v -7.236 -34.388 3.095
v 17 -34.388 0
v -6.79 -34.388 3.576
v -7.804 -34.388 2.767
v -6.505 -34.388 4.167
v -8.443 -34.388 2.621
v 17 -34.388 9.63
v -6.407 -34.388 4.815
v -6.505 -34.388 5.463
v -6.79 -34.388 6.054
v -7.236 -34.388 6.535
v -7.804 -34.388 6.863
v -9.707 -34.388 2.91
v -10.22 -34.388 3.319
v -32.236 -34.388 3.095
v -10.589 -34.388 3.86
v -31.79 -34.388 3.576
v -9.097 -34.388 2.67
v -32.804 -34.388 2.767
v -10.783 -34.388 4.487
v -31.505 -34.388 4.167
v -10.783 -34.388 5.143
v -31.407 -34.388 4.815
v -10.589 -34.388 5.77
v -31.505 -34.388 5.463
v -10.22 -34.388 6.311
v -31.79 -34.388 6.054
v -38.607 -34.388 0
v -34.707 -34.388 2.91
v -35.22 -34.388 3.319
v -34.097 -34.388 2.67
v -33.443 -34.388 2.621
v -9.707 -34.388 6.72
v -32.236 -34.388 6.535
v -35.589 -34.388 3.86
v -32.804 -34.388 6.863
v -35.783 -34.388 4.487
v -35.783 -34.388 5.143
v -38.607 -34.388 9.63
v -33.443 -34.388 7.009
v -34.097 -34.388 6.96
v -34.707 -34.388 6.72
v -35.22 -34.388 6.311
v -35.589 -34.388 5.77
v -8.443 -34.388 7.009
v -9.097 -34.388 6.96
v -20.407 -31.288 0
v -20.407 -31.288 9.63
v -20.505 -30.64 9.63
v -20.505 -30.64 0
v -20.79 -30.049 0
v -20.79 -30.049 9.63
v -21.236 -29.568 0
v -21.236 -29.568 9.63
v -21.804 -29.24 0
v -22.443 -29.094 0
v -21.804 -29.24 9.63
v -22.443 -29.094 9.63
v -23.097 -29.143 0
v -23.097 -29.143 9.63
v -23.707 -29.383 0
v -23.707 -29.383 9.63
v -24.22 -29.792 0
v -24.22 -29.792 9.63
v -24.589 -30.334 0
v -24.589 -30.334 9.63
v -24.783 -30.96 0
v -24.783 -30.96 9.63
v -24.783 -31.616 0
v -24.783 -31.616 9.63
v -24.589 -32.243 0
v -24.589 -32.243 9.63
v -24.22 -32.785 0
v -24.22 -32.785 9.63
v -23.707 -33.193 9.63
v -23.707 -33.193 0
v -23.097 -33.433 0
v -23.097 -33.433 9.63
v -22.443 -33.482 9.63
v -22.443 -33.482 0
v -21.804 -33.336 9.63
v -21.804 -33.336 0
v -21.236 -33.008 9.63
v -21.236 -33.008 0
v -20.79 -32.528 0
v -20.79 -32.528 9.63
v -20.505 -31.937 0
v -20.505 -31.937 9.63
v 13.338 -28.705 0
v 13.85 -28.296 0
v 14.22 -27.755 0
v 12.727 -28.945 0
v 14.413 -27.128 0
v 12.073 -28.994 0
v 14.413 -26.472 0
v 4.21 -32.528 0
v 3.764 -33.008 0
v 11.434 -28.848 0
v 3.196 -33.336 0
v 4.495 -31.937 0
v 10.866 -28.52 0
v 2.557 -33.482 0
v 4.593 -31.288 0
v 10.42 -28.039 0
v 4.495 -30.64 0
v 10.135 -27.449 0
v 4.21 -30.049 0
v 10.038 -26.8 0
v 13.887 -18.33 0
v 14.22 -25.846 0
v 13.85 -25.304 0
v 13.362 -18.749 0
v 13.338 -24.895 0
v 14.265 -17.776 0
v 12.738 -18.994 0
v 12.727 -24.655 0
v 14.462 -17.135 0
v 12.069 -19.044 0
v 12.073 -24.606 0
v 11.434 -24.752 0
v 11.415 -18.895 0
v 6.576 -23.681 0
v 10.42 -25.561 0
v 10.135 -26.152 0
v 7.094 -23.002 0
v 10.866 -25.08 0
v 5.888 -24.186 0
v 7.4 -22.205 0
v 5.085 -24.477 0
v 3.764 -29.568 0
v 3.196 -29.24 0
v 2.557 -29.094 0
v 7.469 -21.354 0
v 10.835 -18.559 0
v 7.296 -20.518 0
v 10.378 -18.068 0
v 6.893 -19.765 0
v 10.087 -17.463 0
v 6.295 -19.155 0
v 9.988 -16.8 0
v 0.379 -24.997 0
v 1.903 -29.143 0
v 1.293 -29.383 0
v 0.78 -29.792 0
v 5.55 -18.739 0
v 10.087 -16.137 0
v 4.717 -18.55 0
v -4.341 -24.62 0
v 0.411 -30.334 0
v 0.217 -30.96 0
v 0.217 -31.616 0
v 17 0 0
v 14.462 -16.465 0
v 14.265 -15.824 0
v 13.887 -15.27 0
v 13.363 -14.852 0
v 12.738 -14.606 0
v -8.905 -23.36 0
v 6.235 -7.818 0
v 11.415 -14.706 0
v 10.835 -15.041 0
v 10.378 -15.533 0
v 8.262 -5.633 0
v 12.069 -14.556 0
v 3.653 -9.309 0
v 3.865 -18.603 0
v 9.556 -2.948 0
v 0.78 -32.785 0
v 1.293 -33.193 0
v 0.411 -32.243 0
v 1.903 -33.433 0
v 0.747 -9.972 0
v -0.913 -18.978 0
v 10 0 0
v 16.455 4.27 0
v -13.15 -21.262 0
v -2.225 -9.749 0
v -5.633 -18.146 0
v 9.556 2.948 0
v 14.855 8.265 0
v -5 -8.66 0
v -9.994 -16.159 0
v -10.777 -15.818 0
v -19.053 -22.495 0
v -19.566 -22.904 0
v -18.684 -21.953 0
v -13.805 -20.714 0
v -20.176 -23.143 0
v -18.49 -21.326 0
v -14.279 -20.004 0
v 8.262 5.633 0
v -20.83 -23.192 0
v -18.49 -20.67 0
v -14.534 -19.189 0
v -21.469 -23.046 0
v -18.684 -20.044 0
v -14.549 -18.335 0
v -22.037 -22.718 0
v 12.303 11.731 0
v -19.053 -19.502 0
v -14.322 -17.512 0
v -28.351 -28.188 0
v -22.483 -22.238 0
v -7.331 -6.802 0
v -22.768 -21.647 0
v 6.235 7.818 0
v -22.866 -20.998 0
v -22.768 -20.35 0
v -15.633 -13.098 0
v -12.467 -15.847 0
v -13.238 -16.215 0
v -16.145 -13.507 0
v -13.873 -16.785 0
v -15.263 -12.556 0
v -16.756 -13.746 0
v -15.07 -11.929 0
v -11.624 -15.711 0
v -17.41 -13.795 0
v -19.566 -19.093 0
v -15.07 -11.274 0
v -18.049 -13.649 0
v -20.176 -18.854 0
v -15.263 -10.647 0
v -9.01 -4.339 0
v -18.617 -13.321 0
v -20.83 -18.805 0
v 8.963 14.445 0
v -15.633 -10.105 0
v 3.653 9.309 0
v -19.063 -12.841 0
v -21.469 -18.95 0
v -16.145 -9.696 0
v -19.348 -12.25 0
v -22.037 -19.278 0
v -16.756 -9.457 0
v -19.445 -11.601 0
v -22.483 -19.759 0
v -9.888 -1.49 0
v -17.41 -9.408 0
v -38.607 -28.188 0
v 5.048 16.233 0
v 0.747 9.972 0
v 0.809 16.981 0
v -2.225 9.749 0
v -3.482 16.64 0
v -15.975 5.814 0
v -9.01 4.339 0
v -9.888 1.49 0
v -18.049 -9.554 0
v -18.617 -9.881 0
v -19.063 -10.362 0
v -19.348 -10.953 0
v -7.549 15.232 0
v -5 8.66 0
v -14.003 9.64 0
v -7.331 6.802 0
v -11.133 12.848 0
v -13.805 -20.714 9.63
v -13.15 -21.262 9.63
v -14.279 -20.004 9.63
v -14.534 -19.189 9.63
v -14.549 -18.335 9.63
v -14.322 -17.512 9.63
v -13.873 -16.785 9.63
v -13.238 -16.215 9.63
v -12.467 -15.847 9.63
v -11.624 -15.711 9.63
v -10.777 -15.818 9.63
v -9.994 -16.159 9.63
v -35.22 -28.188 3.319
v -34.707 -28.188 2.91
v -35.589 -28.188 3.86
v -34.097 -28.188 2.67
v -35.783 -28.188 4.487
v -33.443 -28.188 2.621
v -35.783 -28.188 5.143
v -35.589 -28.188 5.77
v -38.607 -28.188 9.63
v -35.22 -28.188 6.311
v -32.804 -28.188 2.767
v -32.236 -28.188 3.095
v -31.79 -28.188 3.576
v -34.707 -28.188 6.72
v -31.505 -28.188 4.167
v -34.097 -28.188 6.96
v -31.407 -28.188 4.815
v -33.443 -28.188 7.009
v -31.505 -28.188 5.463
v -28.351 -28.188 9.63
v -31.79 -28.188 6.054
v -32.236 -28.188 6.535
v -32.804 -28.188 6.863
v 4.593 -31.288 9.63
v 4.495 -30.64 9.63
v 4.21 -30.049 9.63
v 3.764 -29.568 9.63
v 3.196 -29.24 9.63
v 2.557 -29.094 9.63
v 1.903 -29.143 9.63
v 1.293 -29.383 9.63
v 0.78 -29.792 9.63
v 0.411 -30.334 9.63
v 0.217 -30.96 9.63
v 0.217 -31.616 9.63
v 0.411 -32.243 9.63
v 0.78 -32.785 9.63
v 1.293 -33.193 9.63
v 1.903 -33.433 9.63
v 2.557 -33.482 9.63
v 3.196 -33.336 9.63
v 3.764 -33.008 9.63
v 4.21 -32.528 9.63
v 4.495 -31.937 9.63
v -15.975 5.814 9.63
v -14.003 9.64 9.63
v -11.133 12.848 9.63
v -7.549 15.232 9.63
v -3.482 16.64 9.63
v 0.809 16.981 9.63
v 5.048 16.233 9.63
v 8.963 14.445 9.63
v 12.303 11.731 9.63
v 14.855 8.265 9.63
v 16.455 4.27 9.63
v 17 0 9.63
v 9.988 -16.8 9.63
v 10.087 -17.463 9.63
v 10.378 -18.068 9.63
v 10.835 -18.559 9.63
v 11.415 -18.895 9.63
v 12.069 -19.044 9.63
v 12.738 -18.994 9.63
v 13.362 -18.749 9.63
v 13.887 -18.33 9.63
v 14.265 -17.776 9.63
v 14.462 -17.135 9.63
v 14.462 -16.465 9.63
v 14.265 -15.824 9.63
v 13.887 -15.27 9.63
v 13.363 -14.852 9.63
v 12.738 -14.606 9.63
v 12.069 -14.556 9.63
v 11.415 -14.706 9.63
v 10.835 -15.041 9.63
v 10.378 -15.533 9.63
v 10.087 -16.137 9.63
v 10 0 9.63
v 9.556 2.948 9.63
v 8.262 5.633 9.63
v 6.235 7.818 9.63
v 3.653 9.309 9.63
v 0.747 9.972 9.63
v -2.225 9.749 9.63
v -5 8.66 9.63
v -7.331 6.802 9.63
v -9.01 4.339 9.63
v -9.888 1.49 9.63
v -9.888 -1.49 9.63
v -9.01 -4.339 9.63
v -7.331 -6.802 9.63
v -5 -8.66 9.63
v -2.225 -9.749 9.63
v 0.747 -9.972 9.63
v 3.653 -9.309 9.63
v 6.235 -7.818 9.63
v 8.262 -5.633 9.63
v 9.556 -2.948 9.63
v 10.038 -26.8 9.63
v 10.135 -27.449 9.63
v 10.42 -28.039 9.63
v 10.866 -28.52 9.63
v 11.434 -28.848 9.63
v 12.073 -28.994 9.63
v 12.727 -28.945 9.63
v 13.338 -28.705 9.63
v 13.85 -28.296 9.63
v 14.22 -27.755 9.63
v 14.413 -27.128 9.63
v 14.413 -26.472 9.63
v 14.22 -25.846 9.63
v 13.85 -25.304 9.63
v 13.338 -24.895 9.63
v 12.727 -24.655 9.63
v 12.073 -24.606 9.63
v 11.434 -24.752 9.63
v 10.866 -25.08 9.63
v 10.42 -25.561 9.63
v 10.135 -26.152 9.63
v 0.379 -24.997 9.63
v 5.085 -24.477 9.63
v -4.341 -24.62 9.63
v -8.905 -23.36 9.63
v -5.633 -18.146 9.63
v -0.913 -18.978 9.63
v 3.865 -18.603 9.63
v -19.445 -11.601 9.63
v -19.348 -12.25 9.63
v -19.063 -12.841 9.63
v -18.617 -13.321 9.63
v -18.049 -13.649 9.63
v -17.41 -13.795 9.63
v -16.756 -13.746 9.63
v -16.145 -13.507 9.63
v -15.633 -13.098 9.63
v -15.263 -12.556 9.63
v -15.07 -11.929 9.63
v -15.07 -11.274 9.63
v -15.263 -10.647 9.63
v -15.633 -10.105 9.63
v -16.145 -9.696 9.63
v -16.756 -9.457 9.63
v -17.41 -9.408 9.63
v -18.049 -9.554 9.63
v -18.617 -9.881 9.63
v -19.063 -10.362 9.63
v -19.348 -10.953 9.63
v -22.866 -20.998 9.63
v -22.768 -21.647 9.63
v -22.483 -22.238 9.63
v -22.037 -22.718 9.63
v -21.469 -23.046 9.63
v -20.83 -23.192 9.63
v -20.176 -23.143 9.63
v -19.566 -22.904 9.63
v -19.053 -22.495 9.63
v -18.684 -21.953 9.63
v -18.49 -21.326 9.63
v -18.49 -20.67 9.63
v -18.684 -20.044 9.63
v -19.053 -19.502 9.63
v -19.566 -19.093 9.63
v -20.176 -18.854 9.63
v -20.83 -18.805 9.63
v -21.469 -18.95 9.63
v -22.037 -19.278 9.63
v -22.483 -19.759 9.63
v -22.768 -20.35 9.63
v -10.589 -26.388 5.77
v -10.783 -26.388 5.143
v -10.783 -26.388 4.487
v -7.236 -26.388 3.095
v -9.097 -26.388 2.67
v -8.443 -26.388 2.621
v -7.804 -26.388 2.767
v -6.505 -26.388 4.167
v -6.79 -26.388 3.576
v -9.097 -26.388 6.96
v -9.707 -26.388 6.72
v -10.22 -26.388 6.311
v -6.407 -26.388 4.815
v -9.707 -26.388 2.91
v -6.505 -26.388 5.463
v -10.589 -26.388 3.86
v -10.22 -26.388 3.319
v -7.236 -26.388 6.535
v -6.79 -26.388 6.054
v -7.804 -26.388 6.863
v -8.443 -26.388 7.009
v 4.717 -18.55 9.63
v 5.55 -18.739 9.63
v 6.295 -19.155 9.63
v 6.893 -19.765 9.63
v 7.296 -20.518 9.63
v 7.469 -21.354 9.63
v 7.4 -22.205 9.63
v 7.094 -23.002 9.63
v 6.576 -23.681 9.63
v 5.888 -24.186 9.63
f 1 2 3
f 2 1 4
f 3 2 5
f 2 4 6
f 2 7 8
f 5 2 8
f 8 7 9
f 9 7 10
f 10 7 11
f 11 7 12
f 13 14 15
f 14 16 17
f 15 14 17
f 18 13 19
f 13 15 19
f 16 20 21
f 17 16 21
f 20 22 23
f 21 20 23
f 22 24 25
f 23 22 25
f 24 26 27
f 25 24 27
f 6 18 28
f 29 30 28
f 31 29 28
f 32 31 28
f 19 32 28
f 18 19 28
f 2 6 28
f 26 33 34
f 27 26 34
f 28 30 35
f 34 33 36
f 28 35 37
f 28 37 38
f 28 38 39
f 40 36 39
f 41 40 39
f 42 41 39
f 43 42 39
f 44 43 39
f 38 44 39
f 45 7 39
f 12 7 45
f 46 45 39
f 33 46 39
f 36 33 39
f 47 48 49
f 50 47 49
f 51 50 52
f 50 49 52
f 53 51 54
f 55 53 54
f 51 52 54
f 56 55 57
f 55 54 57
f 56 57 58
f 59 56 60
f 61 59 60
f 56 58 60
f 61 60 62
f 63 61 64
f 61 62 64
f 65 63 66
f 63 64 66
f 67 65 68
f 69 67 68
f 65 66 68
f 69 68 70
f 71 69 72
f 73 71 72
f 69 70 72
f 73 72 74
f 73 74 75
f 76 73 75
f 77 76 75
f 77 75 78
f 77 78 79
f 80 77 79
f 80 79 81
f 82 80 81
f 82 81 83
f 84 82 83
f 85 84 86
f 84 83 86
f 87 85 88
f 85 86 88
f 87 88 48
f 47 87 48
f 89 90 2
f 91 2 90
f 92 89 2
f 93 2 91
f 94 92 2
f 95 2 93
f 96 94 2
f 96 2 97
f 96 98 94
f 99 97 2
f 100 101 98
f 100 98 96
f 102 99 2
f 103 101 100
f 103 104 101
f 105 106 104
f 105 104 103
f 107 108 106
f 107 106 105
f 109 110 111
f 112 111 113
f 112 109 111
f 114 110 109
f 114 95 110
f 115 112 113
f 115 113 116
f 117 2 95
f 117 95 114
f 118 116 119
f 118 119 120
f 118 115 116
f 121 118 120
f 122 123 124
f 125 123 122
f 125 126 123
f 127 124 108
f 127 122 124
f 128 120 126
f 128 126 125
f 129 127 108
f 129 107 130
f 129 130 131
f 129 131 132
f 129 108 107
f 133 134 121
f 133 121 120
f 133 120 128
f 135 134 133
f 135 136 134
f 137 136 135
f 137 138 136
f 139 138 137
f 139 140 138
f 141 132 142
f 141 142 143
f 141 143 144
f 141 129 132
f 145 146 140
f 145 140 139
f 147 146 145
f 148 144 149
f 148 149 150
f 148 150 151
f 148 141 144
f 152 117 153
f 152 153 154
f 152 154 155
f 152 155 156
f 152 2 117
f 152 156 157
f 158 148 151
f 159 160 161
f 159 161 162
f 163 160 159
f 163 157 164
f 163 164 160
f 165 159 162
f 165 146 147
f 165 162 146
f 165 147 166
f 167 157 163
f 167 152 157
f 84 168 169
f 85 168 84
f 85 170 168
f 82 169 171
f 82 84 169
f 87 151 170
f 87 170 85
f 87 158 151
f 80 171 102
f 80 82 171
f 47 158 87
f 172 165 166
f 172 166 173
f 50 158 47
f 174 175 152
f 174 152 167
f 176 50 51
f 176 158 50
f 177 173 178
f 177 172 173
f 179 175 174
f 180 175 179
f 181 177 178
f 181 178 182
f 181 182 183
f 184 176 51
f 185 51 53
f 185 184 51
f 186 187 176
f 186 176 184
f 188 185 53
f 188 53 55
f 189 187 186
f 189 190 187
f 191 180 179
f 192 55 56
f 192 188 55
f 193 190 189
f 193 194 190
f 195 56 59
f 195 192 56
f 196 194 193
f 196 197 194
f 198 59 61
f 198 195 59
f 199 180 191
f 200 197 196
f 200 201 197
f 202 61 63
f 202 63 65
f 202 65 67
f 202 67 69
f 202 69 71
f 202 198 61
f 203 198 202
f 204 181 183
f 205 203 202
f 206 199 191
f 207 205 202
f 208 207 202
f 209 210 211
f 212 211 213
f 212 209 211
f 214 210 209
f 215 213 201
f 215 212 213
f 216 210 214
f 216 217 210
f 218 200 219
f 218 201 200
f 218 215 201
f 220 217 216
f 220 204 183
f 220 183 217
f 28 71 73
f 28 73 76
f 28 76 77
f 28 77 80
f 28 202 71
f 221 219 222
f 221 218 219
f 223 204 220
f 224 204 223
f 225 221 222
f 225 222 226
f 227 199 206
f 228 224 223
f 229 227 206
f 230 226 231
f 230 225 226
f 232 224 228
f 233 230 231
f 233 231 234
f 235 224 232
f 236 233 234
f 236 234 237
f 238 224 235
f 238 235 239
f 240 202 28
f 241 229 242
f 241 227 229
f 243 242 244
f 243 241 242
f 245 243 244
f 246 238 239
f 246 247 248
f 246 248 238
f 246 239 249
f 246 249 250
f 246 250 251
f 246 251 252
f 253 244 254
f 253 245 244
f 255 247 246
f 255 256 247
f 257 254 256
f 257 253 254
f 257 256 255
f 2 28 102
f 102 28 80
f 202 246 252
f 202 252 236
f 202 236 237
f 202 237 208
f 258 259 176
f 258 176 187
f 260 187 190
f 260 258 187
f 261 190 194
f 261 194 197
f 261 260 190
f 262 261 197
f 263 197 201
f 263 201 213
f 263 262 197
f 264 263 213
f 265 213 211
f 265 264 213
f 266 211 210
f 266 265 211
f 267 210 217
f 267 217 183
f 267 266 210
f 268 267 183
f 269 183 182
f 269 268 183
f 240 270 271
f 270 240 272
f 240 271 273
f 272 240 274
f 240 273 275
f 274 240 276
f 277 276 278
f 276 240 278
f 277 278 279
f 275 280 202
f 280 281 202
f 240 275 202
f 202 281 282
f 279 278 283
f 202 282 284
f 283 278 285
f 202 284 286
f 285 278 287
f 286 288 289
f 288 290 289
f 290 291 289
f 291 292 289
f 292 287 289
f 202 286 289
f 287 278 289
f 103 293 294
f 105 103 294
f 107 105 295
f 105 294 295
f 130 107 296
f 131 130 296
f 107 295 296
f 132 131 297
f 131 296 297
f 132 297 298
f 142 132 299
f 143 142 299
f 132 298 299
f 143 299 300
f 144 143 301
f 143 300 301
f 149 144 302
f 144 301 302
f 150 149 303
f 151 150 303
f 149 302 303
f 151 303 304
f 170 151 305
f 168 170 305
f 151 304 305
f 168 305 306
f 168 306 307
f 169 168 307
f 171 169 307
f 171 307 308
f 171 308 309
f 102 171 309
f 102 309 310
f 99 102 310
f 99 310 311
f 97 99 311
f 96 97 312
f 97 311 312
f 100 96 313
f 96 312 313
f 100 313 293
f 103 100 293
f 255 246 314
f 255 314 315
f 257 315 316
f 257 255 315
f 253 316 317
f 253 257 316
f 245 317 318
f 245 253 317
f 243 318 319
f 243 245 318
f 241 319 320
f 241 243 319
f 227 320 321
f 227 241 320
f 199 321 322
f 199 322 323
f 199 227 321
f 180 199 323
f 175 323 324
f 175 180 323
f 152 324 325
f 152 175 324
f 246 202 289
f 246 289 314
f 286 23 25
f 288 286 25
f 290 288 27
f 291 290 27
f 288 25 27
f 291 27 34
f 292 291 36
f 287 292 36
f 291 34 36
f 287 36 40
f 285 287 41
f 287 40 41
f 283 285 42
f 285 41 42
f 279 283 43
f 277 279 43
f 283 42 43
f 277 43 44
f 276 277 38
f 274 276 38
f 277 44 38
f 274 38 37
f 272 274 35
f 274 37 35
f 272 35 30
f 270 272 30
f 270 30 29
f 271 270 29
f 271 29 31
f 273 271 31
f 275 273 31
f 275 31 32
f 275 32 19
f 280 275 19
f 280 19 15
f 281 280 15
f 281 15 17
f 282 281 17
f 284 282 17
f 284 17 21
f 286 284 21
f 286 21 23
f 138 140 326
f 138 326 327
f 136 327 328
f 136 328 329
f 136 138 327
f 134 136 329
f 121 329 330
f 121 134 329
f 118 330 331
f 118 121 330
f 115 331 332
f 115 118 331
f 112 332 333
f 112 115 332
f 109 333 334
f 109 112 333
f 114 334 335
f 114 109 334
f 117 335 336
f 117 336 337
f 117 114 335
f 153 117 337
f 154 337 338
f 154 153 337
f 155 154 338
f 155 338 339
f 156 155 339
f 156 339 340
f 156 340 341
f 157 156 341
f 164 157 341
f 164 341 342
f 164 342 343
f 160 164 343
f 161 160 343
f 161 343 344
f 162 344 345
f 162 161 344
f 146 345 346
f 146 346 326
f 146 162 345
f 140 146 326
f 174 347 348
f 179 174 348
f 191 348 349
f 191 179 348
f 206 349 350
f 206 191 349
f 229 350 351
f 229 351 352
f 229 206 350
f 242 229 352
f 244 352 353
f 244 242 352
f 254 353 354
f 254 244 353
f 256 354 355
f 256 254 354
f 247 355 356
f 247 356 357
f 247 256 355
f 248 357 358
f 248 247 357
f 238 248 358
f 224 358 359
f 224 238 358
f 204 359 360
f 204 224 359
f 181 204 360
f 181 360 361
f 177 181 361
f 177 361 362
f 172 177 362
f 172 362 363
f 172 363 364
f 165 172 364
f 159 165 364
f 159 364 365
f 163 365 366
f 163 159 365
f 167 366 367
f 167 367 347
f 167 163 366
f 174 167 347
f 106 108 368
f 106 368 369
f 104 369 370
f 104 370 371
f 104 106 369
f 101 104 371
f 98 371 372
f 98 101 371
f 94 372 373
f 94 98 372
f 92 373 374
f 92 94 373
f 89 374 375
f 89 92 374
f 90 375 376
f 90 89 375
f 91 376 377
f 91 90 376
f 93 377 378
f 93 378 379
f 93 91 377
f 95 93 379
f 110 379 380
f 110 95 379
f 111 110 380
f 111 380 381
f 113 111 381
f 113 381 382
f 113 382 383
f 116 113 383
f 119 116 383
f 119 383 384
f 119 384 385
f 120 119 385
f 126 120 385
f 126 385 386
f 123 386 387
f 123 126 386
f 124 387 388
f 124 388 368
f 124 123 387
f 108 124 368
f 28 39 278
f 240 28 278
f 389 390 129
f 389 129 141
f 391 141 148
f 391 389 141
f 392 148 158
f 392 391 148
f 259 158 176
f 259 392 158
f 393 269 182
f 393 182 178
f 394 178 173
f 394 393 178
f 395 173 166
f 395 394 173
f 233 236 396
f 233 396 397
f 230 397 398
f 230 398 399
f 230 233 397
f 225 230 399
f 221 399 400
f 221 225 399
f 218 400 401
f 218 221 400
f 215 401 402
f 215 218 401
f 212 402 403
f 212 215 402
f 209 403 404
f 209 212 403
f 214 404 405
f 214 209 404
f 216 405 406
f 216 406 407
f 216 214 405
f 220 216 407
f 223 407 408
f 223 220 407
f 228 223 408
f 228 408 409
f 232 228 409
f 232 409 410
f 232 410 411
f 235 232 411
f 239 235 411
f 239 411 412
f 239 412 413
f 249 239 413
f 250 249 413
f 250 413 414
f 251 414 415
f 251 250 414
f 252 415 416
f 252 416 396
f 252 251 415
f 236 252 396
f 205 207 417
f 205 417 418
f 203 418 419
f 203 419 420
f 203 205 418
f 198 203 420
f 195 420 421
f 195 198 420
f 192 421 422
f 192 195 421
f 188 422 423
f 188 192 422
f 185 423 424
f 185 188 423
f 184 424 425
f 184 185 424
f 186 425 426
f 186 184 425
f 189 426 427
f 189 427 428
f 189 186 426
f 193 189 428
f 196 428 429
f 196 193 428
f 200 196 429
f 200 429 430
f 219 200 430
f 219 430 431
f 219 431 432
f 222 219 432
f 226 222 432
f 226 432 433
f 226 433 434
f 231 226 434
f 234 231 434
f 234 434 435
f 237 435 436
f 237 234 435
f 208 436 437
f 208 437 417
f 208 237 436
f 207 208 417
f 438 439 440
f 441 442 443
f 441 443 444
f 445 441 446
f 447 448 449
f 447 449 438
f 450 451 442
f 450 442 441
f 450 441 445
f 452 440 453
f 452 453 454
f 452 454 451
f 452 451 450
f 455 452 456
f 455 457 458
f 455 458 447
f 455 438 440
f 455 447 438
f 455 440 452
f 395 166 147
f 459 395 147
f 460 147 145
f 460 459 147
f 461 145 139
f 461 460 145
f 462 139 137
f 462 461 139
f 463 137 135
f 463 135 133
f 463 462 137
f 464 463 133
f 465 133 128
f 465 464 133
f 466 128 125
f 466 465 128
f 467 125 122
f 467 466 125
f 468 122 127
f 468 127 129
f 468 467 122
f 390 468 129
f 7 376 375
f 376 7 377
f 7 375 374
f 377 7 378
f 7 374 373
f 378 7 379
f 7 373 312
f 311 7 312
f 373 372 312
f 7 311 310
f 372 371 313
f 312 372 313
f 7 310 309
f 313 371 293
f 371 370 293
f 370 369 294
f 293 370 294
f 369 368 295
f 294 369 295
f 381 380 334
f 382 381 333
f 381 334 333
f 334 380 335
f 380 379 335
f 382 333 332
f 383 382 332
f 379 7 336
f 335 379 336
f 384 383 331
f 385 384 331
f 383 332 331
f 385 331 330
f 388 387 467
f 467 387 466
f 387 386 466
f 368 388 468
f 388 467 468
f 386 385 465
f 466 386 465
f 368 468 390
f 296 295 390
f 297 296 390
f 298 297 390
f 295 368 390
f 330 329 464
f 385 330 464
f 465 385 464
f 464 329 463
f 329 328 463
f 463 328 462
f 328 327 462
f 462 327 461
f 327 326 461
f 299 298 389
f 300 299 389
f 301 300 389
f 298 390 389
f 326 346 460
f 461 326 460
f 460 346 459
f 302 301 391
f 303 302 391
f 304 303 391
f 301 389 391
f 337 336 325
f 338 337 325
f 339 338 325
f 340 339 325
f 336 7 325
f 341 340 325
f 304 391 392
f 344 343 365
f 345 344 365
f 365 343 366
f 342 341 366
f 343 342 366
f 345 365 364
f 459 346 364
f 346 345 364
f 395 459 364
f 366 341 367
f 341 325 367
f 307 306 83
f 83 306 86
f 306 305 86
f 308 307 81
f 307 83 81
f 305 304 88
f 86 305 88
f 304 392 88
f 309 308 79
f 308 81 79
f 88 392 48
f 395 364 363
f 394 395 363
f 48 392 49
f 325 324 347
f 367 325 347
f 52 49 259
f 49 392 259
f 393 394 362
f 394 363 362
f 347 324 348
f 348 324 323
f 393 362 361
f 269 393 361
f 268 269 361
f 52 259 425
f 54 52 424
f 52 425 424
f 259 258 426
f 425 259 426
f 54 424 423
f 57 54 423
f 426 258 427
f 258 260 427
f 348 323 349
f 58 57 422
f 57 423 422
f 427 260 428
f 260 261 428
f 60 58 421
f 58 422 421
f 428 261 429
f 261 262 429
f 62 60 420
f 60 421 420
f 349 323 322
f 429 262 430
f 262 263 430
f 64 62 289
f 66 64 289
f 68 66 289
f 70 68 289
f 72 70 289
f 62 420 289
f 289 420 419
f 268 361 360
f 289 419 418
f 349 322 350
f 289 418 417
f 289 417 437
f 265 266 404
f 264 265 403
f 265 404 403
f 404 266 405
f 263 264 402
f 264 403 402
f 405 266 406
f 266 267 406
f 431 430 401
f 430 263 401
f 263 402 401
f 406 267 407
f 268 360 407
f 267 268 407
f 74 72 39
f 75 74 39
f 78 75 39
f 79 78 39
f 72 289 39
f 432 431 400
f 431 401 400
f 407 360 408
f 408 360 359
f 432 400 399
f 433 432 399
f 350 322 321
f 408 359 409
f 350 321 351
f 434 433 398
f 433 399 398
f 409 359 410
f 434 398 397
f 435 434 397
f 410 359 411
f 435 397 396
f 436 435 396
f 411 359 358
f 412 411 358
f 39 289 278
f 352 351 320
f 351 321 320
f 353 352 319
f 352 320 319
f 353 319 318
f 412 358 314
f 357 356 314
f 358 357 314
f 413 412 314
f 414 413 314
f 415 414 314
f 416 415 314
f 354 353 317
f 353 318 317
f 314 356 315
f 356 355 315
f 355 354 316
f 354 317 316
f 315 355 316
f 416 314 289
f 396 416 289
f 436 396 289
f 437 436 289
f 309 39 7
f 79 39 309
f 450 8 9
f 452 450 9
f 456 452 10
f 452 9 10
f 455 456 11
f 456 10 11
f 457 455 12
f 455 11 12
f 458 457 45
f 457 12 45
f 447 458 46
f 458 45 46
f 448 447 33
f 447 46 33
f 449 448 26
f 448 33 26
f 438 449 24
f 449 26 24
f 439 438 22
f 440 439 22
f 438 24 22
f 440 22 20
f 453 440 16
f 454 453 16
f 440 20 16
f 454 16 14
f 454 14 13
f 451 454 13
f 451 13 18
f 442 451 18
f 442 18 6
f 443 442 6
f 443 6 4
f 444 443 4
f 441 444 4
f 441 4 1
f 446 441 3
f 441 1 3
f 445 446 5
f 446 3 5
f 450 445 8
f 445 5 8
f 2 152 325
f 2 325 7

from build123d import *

# Parameters (mm, degrees)
SKETCH1_R           = 10
EXTRUDE_3_8_DEPTH   = 9.63
SKETCH2_R           = 2.2
SKETCH2_R_2         = 2.25
M4_THROUGH_DEPTH    = 9.63
CUT_EXTRUDE2_DEPTH  = 9.63
BOSS_EXTRUDE2_DEPTH = 9.63
SKETCH5_R           = 2.2
M5_DRILL_DEPTH      = 8
SKETCH7_R           = 2.2
M4_THROUGH2_DEPTH   = 9.63


with BuildPart() as part:
    # Sketch1 → 3/8 (new body)
    with BuildSketch(Plane.XY):
        with BuildLine():
            Line((17, 0), (17, -34.388204953))
            Line((17, -34.388204953), (-30.607305145, -34.388204953))
            Line((-30.607305145, -34.388204953), (-15.974774553, 5.814342437))
            ThreePointArc((-15.974774553, 5.814342437), (2.95201902, 16.741731801), (17, 0))
        make_face()
        Circle(SKETCH1_R, mode=Mode.SUBTRACT)
    extrude(amount=EXTRUDE_3_8_DEPTH)

    # Sketch2 → M4_through (cut)
    with BuildSketch(Plane.XY):
        with Locations(Location((12.2375, -26.800082425, 0), (0, 0, 180))):
            Circle(SKETCH2_R)
        with Locations(Location((12.2375, -16.800082425, 0), (0, 0, 180))):
            Circle(SKETCH2_R_2)
        with Locations(Location((-20.665656479, -20.998368188, 0), (0, 0, 180))):
            Circle(SKETCH2_R)
        with Locations(Location((-17.245455046, -11.60144198, 0), (0, 0, 180))):
            Circle(SKETCH2_R)
    extrude(amount=M4_THROUGH_DEPTH, mode=Mode.SUBTRACT)

    # Sketch4 → Cut-Extrude2 (cut)
    with BuildSketch(Plane.XY.offset(9.63)):
        with BuildLine():
            ThreePointArc((-9.994224888, -16.159067699), (-3.299315376, -18.711347307), (3.864772727, -18.602782904))
            ThreePointArc((3.864772727, -18.602782904), (7.412281511, -20.929837142), (5.085227273, -24.477345926))
            ThreePointArc((5.085227273, -24.477345926), (-4.341204442, -24.620193825), (-13.150295905, -21.261931182))
            ThreePointArc((-13.150295905, -21.261931182), (-14.123692138, -17.132463932), (-9.994224888, -16.159067699))
        make_face()
    extrude(amount=-CUT_EXTRUDE2_DEPTH, mode=Mode.SUBTRACT)

    # Sketch6 → Boss-Extrude2 (add)
    with BuildSketch(Plane.XY.offset(9.63)):
        Polygon((-30.607305145, -34.388204953), (-38.607305145, -34.388204953), (-38.607305145, -28.188204953), (-28.350689692, -28.188204953), align=None)
    extrude(amount=-BOSS_EXTRUDE2_DEPTH)

    # Sketch5 → M5_DRILL (cut)
    with BuildSketch(Plane.XZ.offset(34.388204953)):
        with Locations((-33.607305145, 4.815)):
            Circle(SKETCH5_R)
        with Locations((-8.607305145, 4.815)):
            Circle(SKETCH5_R)
    extrude(amount=-M5_DRILL_DEPTH, mode=Mode.SUBTRACT)

    # Sketch7 → M4_through2 (cut)
    with BuildSketch(Plane.XY.offset(9.63)):
        with Locations((-22.607305145, -31.288204953)):
            Circle(SKETCH7_R)
        with Locations((2.392694855, -31.288204953)):
            Circle(SKETCH7_R)
    extrude(amount=-M4_THROUGH2_DEPTH, mode=Mode.SUBTRACT)


solid = part.part
